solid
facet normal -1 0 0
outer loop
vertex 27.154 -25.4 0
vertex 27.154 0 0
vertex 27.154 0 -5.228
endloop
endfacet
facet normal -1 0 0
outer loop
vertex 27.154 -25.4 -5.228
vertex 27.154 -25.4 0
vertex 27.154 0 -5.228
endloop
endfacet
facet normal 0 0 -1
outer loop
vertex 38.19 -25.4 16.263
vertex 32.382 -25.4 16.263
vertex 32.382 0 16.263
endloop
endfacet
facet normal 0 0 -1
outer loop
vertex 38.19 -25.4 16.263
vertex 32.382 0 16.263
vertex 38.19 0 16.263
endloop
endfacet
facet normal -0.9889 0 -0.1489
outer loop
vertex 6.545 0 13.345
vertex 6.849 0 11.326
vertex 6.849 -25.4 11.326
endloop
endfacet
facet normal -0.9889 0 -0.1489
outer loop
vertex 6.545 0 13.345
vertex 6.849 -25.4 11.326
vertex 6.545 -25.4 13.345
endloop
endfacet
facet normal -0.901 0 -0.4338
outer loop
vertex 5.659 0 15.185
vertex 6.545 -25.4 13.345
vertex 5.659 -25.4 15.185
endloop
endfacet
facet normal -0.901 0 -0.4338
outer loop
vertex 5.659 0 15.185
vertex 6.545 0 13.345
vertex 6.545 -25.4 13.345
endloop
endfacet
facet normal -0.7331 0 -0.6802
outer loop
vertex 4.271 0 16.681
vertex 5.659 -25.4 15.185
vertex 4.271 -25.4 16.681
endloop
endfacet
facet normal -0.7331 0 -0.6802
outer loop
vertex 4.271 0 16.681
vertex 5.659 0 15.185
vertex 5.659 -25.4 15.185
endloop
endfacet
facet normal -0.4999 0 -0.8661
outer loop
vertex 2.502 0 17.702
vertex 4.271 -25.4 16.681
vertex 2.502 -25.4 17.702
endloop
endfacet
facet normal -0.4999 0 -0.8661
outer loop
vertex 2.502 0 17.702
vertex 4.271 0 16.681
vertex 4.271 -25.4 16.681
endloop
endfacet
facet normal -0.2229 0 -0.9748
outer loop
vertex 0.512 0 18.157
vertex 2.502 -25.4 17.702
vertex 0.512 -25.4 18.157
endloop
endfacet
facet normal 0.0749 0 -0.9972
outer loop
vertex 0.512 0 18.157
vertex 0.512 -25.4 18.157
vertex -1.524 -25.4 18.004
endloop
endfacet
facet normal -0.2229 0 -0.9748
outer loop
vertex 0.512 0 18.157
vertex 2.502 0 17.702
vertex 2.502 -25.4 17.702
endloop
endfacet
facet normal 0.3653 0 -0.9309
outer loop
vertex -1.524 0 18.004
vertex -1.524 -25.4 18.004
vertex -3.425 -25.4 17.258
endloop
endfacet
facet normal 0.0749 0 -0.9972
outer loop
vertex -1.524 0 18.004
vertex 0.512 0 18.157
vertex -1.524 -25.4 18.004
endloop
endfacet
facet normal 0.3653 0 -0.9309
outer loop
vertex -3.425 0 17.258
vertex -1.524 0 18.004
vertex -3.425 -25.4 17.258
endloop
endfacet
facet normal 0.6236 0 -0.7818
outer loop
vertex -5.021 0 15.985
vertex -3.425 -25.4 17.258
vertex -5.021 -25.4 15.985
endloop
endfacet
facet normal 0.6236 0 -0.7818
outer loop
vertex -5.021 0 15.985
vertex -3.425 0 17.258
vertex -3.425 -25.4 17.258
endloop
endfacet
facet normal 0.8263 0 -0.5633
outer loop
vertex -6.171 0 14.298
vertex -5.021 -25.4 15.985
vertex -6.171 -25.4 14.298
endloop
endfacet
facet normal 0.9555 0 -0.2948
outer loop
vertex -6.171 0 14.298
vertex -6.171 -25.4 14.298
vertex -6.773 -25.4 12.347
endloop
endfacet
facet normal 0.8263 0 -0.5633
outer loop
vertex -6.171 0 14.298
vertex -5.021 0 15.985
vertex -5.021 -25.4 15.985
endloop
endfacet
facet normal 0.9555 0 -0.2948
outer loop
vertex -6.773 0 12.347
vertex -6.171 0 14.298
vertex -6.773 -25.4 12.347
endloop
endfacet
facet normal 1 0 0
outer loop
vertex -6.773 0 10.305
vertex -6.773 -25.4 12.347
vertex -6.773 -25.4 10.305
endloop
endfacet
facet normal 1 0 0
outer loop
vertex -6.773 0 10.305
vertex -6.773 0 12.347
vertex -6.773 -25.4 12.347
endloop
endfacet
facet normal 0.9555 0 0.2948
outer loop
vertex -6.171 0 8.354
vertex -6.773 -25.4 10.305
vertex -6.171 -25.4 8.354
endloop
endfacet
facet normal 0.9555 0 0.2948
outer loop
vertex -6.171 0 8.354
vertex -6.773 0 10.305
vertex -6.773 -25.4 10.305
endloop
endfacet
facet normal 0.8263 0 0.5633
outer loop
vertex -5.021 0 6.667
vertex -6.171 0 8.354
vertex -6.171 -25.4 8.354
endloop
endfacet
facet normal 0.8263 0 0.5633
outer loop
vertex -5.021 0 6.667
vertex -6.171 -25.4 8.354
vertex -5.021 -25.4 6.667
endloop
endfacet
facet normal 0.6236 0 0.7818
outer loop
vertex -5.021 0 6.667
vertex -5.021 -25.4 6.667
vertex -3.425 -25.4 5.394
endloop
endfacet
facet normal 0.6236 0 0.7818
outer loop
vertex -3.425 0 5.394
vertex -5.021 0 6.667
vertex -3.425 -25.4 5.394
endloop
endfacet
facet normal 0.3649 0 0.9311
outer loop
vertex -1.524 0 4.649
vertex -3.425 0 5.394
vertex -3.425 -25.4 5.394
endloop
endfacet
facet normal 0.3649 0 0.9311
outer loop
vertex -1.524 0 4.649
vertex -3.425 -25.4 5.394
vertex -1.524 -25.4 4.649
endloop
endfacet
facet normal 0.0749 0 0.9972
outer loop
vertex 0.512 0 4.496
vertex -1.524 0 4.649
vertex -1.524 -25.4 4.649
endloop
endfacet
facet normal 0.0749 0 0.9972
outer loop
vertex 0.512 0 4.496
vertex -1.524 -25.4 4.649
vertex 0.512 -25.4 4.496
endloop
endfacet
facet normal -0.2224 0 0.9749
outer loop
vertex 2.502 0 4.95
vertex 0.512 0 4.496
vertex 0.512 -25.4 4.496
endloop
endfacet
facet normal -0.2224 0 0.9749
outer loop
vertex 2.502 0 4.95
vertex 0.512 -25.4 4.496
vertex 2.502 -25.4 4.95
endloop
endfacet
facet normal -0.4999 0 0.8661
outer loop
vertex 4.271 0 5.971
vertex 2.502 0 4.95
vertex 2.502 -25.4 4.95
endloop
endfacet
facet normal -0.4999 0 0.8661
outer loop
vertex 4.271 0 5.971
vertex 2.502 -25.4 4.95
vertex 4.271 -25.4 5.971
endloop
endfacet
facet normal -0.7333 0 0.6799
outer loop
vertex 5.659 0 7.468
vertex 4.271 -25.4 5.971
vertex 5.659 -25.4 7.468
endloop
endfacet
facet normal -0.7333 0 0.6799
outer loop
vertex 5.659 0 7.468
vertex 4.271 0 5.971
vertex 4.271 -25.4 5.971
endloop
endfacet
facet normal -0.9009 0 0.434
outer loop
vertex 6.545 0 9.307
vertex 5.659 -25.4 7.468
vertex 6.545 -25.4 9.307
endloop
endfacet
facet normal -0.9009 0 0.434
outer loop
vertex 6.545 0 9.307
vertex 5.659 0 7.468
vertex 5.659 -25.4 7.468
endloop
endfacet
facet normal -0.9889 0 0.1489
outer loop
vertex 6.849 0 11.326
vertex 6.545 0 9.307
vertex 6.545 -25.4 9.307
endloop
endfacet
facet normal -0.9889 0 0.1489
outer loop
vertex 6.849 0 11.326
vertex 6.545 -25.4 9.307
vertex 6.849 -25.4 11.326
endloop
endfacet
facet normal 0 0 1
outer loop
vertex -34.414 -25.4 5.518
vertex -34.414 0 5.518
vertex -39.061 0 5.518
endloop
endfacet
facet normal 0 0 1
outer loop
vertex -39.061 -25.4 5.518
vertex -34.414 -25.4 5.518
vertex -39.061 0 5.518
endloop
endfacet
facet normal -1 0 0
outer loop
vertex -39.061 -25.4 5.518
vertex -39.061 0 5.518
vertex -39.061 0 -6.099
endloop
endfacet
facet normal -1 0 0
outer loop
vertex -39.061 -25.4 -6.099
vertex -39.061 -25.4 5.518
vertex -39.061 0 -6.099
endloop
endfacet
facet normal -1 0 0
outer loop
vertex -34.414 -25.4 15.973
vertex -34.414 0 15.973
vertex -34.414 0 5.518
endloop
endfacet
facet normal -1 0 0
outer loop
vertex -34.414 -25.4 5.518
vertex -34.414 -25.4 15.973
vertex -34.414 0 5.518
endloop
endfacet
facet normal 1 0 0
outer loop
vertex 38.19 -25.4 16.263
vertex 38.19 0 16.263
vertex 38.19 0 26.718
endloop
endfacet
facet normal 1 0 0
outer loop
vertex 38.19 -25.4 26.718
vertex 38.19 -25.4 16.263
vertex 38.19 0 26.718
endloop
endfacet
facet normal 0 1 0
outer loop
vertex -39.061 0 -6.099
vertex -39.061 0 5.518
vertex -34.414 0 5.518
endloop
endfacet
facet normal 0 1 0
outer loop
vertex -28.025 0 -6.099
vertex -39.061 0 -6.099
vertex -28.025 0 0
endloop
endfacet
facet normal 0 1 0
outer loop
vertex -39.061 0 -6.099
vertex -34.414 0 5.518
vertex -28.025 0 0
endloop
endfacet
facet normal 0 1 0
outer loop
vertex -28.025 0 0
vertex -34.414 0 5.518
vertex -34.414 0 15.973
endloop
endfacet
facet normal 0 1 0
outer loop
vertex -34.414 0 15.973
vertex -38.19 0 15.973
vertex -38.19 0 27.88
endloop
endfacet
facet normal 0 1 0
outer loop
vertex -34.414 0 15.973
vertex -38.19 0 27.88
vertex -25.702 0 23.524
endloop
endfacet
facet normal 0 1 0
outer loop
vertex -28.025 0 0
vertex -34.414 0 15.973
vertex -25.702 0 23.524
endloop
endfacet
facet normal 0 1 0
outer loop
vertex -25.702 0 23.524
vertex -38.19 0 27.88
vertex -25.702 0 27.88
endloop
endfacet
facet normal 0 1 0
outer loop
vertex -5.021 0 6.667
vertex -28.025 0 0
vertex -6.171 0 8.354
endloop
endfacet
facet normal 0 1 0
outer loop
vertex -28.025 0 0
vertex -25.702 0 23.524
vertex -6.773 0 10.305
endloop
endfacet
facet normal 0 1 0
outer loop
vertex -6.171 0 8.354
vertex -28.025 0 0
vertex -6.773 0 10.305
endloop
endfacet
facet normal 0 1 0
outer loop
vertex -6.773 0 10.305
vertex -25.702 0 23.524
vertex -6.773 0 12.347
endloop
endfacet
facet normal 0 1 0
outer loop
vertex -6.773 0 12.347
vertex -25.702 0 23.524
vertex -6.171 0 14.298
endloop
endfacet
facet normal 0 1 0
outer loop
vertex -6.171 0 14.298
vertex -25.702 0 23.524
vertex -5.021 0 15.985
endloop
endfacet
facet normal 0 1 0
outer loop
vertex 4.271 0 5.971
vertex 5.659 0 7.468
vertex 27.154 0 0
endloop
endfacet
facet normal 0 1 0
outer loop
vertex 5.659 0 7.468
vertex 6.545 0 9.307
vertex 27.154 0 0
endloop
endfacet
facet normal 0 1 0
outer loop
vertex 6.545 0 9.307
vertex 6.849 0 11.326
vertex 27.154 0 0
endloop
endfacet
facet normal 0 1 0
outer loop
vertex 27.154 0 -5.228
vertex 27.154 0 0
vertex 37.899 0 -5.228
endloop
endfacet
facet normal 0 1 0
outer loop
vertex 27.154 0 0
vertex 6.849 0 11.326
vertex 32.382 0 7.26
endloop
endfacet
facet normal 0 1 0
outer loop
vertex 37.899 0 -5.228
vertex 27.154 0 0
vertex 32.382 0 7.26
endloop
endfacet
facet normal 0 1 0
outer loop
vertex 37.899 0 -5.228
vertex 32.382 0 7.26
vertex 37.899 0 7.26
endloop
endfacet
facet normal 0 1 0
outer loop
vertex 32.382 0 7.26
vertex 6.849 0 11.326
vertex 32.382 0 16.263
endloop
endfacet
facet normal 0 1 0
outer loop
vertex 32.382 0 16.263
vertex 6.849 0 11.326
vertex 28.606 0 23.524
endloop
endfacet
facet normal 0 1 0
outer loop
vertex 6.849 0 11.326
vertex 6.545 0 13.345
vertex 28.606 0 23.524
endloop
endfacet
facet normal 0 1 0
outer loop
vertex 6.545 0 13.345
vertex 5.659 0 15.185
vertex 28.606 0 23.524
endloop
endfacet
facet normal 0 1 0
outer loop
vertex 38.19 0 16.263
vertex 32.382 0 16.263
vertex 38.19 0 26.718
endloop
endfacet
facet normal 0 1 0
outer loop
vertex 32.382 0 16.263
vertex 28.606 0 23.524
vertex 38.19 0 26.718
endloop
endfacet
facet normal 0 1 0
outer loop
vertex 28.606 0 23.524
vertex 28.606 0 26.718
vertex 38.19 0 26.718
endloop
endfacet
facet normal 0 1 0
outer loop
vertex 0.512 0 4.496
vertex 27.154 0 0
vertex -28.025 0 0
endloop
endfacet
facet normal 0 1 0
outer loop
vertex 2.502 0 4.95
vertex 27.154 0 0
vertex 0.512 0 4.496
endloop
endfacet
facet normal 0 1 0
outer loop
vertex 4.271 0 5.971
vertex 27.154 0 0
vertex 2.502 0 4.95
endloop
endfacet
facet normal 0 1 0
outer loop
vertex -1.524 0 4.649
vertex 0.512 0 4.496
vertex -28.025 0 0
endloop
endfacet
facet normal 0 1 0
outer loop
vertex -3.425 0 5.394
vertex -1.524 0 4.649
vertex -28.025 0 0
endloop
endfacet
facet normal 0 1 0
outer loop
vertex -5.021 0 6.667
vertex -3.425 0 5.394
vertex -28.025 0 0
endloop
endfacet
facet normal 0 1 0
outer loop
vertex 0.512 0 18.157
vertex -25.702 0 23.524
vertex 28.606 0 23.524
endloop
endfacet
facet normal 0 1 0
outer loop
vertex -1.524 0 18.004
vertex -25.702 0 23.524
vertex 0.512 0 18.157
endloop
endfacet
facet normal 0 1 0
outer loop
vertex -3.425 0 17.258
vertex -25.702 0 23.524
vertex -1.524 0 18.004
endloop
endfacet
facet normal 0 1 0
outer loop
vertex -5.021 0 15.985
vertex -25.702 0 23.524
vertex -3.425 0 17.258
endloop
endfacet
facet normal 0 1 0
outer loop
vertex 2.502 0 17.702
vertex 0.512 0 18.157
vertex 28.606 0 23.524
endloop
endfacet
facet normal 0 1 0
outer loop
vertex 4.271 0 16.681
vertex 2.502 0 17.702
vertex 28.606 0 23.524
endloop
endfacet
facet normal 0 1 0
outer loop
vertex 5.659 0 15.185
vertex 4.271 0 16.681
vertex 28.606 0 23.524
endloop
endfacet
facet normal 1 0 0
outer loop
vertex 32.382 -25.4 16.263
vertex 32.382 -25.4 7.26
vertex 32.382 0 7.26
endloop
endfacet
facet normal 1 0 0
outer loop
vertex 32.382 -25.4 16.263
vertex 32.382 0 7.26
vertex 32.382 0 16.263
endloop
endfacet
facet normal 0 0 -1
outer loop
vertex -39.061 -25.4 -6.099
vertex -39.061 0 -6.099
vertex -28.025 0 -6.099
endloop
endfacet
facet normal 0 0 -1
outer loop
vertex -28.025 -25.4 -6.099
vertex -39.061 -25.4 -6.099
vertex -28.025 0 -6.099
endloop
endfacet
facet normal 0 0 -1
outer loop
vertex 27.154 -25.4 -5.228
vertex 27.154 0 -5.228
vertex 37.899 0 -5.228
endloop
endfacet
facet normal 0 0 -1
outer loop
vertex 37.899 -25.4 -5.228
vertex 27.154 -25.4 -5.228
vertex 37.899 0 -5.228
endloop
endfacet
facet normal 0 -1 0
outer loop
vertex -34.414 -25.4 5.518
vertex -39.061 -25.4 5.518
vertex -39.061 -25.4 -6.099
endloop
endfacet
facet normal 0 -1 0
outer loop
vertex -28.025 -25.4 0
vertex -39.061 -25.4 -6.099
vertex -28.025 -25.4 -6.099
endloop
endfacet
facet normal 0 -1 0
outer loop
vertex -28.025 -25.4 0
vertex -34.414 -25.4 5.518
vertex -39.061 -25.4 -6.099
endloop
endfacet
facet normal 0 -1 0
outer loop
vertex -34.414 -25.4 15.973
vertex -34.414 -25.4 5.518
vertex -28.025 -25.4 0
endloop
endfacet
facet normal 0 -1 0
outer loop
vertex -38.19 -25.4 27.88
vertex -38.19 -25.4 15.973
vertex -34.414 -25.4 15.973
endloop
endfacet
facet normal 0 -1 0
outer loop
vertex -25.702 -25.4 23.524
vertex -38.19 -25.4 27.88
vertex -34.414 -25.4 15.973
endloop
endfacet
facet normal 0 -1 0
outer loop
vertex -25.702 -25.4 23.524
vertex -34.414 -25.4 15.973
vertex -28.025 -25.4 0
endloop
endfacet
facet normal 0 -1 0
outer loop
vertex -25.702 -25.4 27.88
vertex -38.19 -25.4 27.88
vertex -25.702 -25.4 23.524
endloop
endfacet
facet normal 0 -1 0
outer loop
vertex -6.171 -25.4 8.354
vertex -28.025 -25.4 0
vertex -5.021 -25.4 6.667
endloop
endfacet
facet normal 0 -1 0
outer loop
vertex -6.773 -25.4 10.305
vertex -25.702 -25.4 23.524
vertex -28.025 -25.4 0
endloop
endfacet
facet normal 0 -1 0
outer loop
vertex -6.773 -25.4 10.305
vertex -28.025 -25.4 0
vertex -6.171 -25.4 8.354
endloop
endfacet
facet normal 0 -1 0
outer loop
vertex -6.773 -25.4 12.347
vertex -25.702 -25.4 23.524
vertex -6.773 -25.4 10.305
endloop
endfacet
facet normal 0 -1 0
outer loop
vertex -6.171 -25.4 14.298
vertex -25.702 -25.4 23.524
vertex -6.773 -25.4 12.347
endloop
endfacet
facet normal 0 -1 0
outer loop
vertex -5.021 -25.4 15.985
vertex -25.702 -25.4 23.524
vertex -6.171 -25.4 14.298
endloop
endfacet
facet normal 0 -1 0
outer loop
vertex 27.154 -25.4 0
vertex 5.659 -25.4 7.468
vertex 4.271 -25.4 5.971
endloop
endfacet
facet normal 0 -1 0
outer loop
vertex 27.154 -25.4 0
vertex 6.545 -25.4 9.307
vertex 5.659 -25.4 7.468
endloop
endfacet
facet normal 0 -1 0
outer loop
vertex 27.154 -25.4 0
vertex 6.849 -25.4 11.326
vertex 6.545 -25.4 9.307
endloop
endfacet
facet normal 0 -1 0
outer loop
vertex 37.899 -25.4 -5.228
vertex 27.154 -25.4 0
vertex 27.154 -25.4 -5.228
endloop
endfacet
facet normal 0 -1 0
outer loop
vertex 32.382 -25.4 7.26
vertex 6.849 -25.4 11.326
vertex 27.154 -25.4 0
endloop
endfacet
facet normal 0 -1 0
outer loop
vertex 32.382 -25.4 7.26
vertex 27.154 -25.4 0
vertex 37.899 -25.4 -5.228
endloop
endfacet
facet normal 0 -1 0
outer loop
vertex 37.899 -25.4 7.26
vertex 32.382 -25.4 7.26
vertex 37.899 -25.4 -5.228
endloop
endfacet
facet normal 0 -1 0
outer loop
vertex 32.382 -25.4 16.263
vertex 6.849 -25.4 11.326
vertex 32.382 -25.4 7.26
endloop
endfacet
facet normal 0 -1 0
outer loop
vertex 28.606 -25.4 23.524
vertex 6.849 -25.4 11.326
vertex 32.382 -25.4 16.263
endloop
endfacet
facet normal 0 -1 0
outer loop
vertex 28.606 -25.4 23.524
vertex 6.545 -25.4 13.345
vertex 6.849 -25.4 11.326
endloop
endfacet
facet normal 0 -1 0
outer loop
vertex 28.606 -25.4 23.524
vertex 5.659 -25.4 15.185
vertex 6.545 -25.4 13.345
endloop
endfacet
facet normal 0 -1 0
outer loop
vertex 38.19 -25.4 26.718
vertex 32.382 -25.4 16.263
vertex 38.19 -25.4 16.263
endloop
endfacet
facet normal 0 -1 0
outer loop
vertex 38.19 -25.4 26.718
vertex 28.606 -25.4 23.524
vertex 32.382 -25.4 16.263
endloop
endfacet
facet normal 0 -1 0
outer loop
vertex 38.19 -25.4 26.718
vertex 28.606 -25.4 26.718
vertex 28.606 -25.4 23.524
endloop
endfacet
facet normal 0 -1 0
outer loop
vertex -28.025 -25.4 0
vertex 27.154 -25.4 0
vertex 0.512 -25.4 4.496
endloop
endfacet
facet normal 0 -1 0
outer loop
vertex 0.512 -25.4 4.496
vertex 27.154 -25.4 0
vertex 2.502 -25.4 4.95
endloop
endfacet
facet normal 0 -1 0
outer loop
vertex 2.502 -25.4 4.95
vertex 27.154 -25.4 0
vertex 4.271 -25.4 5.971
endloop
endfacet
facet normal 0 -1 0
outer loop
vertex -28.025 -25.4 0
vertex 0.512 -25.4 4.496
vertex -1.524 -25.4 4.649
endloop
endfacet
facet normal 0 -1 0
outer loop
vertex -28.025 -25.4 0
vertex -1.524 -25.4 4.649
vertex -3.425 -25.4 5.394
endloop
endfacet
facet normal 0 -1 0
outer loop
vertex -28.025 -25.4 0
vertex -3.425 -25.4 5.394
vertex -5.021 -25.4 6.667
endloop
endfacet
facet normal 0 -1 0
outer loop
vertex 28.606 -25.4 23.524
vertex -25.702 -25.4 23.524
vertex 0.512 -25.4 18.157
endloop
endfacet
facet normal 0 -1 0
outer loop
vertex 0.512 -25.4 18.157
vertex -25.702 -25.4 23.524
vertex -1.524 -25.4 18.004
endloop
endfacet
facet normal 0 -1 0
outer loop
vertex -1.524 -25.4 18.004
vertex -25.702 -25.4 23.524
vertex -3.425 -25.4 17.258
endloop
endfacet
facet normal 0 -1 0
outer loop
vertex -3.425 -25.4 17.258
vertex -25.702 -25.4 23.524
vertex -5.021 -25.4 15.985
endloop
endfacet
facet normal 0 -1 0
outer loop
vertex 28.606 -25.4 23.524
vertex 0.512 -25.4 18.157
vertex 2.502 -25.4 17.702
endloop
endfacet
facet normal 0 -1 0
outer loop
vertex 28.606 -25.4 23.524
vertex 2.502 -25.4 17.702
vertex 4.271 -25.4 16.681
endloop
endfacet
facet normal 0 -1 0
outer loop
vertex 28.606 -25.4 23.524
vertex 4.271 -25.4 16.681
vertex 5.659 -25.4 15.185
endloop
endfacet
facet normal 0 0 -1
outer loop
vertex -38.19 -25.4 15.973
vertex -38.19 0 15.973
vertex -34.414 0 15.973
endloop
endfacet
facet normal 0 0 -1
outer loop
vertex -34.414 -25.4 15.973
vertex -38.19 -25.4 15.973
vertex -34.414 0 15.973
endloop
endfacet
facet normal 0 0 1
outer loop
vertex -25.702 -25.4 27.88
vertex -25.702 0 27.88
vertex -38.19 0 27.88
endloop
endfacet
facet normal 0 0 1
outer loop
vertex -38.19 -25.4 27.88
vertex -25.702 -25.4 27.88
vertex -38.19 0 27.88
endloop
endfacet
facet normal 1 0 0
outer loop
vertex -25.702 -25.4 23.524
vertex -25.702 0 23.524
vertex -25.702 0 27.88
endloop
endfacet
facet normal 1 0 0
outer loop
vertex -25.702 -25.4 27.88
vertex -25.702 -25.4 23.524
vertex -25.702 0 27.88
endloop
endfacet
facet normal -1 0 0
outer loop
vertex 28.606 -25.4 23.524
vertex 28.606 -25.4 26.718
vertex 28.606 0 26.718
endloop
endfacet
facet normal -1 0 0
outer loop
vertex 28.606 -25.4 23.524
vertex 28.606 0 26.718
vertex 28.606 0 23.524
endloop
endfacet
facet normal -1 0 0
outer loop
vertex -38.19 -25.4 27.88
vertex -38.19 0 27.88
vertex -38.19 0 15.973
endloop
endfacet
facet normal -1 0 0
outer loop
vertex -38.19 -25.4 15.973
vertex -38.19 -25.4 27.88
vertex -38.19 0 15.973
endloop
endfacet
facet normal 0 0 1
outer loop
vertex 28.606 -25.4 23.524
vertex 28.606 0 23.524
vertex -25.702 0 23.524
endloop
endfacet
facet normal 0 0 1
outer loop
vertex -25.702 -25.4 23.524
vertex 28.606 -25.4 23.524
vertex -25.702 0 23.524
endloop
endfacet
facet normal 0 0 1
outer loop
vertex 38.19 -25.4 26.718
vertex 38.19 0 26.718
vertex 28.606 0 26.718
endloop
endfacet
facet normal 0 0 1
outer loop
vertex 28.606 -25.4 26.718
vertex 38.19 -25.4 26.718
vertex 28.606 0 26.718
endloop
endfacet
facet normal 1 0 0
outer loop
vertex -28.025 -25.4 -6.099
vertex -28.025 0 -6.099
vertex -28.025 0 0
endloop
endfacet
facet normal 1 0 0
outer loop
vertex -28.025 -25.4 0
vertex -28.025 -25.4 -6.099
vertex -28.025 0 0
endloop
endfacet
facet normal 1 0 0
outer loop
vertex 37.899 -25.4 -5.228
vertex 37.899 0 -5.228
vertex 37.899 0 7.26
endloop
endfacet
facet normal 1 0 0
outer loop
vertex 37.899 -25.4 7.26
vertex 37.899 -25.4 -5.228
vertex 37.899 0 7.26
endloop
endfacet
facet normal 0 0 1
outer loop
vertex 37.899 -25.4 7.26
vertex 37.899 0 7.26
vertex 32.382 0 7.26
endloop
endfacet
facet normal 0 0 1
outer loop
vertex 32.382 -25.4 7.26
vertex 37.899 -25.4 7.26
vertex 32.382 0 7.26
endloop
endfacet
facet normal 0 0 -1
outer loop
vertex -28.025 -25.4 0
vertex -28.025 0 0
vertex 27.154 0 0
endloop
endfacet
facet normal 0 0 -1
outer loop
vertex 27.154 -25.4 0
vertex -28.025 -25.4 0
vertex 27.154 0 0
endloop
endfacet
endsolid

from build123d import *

# Parameters (mm, degrees)
F0_W     = 8.7125245482
F0_H     = 7.5508523732
F0_R     = 6.8494820219
F0_W_2   = 3.7754308432
F0_H_2   = 7.2604361922
F1_DEPTH = 25.4
F0_W_3   = 6.3891839236
F0_H_3   = 5.5179311894
F0_W_4   = 5.2275173366
F0_H_4   = 7.2604357265
F2_DEPTH = 25.4


with BuildPart() as f1:
    # F0 (on Front) → F1 (new body)
    with BuildSketch(Plane.XZ):
        with Locations((-30.0582041964, 19.7483850643)):
            Rectangle(F0_W, F0_H)
        Polygon((28.6061149091, 23.5238112509), (-25.7019419223, 23.5238112509), (-25.7019419223, 15.9729588777), (-34.4144664705, 15.9729588777), (-34.4144664705, 5.5179311894), (-28.0252825469, 5.5179311894), (-28.0252825469, 0), (27.1540284157, 0), (27.1540284157, 7.2604357265), (32.3815457523, 7.2604357265), (32.3815457523, 16.2633750588), (28.6061149091, 16.2633750588), align=None)
        with Locations((0, 11.3262794912)):
            Circle(F0_R, mode=Mode.SUBTRACT)
        with Locations((30.4938303307, 19.8935931548)):
            Rectangle(F0_W_2, F0_H_2)
    extrude(amount=F1_DEPTH)

    # F0 (on Front) → F2 (join)
    with BuildSketch(Plane.XZ):
        Polygon((-34.4144664705, 15.9729588777), (-34.4144664705, 23.5238112509), (-25.7019419223, 23.5238112509), (-25.7019419223, 27.8800725937), (-38.1898917258, 27.8800725937), (-38.1898917258, 15.9729588777), align=None)
        with Locations((-30.0582041964, 19.7483850643)):
            Rectangle(F0_W, F0_H)
        Polygon((28.6061149091, 23.5238112509), (-25.7019419223, 23.5238112509), (-25.7019419223, 15.9729588777), (-34.4144664705, 15.9729588777), (-34.4144664705, 5.5179311894), (-28.0252825469, 5.5179311894), (-28.0252825469, 0), (27.1540284157, 0), (27.1540284157, 7.2604357265), (32.3815457523, 7.2604357265), (32.3815457523, 16.2633750588), (28.6061149091, 16.2633750588), align=None)
        with Locations((0, 11.3262794912)):
            Circle(F0_R, mode=Mode.SUBTRACT)
        Polygon((28.6061149091, 26.718404144), (28.6061149091, 23.5238112509), (32.3815457523, 23.5238112509), (32.3815457523, 16.2633750588), (38.1898917258, 16.2633750588), (38.1898917258, 26.718404144), align=None)
        with Locations((30.4938303307, 19.8935931548)):
            Rectangle(F0_W_2, F0_H_2)
        with Locations((-31.2198745087, 2.7589655947)):
            Rectangle(F0_W_3, F0_H_3)
        Polygon((-34.4144664705, 0), (-34.4144664705, 5.5179311894), (-39.0611439943, 5.5179311894), (-39.0611439943, -6.0987658799), (-28.0252825469, -6.0987658799), (-28.0252825469, 0), align=None)
        Polygon((37.8994755447, 7.2604357265), (32.3815457523, 7.2604357265), (32.3815457523, 0), (27.1540284157, 0), (27.1540284157, -5.2275136113), (37.8994755447, -5.2275136113), align=None)
        with Locations((29.767787084, 3.6302178632)):
            Rectangle(F0_W_4, F0_H_4)
    extrude(amount=F2_DEPTH)


solid = f1.part
